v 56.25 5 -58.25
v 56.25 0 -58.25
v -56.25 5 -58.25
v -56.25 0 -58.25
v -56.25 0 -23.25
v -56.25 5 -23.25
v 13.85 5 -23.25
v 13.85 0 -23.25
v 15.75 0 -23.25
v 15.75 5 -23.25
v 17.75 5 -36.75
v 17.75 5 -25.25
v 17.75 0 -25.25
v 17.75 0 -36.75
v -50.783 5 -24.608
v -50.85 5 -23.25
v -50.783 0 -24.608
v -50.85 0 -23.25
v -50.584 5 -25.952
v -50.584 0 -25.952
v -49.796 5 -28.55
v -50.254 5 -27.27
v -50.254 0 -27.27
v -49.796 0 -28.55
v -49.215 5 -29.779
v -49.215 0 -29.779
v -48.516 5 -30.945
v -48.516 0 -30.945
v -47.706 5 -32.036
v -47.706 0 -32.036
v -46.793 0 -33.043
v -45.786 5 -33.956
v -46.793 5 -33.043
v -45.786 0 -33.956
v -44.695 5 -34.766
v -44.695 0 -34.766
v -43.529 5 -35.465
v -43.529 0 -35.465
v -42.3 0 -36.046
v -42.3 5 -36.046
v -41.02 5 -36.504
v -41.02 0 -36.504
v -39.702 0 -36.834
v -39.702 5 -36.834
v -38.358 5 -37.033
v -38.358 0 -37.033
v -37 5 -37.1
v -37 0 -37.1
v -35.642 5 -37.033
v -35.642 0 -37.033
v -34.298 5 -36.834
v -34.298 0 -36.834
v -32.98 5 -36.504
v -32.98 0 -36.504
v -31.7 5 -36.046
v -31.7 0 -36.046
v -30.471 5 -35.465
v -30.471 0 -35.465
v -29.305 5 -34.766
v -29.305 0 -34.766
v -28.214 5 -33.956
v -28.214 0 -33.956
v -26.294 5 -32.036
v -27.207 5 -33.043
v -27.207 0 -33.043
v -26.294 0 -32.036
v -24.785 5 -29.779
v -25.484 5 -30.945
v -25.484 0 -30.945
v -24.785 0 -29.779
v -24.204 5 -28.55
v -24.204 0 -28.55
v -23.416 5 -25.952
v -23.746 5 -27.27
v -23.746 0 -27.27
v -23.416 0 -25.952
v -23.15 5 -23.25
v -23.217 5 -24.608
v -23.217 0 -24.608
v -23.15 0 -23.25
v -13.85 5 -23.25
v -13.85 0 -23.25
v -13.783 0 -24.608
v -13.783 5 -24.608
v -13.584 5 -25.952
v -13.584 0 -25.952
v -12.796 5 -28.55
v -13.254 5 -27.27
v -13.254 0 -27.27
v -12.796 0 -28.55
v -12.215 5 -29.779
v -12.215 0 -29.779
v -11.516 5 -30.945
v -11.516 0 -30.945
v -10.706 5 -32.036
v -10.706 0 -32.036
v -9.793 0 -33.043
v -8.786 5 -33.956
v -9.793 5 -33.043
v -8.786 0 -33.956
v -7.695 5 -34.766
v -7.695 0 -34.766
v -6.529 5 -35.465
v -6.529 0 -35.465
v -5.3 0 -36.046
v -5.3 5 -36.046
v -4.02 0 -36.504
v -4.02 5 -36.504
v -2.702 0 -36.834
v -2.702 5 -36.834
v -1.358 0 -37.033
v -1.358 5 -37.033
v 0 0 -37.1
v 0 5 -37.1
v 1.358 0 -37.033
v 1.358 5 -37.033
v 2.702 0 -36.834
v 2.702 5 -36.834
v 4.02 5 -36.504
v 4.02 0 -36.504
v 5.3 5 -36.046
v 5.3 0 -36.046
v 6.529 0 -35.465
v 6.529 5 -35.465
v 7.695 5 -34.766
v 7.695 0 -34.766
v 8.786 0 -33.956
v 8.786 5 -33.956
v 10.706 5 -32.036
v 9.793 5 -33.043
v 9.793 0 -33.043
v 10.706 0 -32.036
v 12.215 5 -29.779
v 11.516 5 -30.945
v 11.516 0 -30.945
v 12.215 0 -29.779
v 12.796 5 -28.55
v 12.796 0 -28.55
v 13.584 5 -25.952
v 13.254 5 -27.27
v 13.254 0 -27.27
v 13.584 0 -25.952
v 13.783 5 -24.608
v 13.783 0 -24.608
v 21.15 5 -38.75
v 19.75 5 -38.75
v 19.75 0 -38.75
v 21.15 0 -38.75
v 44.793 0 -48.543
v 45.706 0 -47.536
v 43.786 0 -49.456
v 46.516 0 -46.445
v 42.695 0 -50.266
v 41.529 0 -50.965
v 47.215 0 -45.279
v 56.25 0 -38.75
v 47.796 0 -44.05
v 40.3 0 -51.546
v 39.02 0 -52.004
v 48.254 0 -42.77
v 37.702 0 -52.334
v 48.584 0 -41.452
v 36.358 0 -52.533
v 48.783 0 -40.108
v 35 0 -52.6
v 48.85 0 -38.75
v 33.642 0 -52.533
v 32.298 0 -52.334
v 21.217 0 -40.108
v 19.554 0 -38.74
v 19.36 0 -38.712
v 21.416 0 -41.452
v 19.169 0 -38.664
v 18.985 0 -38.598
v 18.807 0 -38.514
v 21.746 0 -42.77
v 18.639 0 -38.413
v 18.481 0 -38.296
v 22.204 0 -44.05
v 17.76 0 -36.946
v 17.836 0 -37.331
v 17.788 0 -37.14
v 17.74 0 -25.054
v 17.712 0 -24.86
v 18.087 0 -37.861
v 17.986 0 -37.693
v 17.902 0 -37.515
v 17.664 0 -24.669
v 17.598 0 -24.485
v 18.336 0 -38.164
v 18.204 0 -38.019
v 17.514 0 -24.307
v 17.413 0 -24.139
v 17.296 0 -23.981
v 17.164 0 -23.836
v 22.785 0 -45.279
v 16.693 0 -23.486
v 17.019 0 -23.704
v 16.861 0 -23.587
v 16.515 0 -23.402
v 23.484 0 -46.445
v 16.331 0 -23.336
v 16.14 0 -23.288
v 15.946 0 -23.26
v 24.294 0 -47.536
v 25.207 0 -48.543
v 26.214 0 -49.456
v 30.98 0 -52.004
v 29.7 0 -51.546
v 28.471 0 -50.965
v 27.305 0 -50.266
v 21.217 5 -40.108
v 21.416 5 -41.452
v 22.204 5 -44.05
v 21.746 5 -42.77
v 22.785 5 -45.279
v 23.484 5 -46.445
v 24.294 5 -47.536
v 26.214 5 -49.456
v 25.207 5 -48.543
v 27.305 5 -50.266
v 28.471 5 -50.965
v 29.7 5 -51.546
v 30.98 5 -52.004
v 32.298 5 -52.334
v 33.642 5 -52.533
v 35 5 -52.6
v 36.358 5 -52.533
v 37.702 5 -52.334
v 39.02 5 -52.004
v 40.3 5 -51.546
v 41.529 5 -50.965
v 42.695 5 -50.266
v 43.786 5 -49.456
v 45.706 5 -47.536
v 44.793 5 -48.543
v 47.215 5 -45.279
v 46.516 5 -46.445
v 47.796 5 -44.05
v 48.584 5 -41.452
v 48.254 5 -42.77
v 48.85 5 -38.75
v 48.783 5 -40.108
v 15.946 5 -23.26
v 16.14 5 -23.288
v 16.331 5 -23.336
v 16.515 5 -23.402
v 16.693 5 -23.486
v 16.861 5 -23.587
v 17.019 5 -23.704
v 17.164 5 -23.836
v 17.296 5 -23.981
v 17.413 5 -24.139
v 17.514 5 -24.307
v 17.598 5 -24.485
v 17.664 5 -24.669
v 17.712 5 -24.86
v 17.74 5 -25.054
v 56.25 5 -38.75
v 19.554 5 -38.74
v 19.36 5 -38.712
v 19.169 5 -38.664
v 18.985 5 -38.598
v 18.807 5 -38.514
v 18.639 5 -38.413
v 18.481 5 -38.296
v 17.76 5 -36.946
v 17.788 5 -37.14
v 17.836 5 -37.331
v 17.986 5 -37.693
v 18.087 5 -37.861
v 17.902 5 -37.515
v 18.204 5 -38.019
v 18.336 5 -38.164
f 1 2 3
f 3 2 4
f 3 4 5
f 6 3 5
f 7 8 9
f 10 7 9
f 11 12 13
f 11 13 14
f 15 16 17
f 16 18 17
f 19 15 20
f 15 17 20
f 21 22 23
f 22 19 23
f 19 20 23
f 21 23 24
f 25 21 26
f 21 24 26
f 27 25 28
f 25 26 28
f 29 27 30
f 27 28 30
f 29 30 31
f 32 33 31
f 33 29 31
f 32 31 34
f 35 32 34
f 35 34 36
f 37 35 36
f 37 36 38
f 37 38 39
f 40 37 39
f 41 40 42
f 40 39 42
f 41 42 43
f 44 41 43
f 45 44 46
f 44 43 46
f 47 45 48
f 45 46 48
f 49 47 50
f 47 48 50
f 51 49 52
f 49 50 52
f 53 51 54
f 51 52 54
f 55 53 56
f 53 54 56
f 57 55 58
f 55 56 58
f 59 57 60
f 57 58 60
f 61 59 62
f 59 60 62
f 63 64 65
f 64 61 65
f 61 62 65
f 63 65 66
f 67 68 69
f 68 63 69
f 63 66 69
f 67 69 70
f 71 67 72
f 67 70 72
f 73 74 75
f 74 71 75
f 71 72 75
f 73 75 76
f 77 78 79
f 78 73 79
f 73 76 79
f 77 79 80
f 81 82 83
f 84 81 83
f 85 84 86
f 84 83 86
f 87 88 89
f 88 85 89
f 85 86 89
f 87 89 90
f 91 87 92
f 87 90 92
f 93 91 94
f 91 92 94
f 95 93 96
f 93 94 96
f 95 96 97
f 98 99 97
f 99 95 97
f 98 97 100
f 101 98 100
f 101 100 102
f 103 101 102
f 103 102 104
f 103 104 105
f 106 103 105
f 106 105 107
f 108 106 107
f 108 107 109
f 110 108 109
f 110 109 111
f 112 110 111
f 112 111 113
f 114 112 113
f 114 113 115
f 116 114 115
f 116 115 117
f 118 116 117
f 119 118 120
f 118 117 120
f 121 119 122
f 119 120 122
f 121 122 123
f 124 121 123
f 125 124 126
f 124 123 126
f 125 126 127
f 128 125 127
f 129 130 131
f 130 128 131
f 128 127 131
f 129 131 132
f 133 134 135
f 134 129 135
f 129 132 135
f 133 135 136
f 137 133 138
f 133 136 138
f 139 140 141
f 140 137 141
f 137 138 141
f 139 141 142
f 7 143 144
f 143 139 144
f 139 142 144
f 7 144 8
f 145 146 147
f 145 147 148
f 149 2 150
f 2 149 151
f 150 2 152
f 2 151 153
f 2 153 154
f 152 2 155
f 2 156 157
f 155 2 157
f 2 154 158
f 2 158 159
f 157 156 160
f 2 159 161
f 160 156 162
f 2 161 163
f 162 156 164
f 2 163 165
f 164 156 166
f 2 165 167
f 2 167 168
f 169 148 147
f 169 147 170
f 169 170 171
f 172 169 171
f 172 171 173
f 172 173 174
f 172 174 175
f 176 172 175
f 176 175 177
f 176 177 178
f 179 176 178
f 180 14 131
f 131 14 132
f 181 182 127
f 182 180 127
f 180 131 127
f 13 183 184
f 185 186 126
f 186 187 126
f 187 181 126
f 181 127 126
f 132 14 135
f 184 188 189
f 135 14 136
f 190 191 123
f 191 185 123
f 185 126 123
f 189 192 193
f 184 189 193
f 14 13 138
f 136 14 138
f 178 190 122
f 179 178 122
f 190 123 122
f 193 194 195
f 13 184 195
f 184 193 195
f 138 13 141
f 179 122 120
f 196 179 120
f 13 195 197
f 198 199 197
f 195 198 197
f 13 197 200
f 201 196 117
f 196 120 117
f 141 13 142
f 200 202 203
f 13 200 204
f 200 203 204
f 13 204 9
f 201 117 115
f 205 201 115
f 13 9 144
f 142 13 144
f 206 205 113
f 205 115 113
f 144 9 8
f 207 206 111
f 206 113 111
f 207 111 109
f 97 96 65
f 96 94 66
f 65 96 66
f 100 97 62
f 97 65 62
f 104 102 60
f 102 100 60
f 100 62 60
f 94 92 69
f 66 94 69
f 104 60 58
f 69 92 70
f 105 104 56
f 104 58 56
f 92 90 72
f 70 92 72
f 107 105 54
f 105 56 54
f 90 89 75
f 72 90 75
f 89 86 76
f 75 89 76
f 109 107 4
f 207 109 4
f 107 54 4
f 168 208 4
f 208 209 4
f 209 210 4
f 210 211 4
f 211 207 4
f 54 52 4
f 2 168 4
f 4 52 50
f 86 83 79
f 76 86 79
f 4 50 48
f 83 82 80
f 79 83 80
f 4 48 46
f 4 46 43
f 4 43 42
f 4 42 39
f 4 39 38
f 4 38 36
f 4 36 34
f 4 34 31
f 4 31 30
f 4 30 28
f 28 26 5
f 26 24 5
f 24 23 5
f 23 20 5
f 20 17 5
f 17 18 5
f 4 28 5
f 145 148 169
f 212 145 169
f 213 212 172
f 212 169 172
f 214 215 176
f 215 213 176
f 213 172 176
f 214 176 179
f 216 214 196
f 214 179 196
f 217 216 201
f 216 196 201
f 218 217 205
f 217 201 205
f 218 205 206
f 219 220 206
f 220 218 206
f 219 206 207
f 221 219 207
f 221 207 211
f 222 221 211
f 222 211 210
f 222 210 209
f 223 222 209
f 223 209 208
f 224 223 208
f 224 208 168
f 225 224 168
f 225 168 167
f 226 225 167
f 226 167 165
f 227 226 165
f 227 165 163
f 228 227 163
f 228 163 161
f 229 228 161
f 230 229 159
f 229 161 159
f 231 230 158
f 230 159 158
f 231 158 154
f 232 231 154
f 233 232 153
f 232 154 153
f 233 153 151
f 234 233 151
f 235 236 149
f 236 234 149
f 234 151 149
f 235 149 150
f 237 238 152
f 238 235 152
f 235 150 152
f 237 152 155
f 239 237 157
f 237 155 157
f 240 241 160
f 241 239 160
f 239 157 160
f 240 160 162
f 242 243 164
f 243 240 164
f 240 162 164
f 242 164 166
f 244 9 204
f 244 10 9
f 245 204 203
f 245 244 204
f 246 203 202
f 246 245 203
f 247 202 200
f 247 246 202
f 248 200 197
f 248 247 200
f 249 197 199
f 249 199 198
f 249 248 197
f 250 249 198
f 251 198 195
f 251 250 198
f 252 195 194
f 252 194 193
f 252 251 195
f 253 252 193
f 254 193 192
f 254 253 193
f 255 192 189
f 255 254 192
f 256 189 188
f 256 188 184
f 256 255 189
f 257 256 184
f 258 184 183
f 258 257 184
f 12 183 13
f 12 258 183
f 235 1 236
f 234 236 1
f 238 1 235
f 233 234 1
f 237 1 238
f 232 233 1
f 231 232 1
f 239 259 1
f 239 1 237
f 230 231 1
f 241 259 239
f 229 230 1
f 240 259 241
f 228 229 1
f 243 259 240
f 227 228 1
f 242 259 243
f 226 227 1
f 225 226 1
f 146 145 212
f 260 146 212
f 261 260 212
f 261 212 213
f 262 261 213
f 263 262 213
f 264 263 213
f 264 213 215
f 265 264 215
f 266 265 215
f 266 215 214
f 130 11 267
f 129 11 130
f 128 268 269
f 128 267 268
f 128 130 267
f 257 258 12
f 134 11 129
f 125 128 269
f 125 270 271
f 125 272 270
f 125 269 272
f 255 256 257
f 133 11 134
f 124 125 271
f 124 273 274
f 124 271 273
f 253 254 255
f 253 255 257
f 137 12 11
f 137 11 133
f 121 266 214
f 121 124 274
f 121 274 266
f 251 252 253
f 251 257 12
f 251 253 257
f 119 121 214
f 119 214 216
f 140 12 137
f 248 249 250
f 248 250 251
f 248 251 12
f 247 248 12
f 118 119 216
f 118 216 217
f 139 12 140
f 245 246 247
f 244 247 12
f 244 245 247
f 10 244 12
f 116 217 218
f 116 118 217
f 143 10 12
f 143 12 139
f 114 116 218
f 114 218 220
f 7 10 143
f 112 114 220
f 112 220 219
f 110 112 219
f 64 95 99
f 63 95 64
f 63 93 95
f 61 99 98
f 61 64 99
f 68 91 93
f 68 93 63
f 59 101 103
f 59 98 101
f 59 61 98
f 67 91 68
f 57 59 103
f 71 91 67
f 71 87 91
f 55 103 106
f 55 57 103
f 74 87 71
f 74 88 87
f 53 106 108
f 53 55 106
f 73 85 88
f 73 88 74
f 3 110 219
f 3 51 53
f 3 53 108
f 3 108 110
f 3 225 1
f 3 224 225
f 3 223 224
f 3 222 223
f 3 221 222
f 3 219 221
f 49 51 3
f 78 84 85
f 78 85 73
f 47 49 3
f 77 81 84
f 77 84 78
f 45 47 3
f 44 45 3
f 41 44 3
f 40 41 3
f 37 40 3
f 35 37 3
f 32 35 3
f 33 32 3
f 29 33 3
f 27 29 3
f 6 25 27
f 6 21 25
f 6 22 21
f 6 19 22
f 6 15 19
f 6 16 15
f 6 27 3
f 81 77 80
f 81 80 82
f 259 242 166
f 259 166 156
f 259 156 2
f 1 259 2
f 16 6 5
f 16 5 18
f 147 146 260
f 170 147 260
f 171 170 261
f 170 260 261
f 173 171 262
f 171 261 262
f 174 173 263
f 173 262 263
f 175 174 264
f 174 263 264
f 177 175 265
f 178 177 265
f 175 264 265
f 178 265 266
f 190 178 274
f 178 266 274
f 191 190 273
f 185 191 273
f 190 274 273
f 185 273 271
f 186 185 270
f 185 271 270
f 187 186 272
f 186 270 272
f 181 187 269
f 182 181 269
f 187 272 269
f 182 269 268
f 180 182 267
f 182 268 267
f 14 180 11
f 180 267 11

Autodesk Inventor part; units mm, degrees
ref_plane "YZ Plane" through (0, 0, 0) normal (1, 0, 0) x (0, 1, 0)
ref_plane "XZ Plane" through (0, 0, 0) normal (0, 1, 0) x (-1, 0, 0)
ref_plane "XY Plane" through (0, 0, 0) normal (0, 0, 1) x (1, 0, 0)
sketch "Sketch1" plane through (0, 0, 0) normal (0, 1, 0) x (-1, 0, 0)
  circle A0 centre (18.5, 28) radius 23.85
  circle A1 centre (37, -23.25) radius 13.85
  circle A2 centre (-35, -38.75) radius 13.85
  circle A3 centre (-30.9, 25.8) radius 13.85
  circle A4 centre (0, -23.25) radius 13.85
  line L0 (56.25, 58.25) -> (-56.25, 58.25)
  line L1 (-56.25, -58.25) -> (56.25, -58.25)
  line L2 (0, -105.9299) -> (0, 123.2086) construction
  line L3 (-76.4777, -38.75) -> (-5.35, -38.75) construction
  line L4 (-123.5447, -23.25) -> (82.5572, -23.25) construction
  line L5 (56.25, -58.25) -> (56.25, 58.25)
  line L6 (56.25, 58.25) -> (56.25, -58.25)
  line L7 (-56.25, 58.25) -> (-56.25, -58.25)
  line L8 (100.0459, 28) -> (-13.85, 28) construction
  line L9 (-9.7154, 25.8) -> (-68.4996, 25.8) construction
  line L10 (18.5, 82.6038) -> (18.5, -4.654) construction
  line L11 (-30.9, 82.6038) -> (-30.9, 8.6393) construction
  line L12 (-46.6436, -58.25) -> (-56.25, -58.25) construction
  line L13 (-56.25, -58.25) -> (-56.25, -31.25) construction
  line L14 (-56.25, -31.25) -> (-46.6436, -31.25) construction
  line L15 (-46.6436, -31.25) -> (-46.6436, -58.25) construction
  line L16 (56.25, -58.25) -> (48.3059, -58.25) construction
  line L17 (48.3059, -58.25) -> (48.3059, -31.25) construction
  line L18 (48.3059, -31.25) -> (56.25, -31.25) construction
  line L19 (56.25, -31.25) -> (56.25, -58.25) construction
  point P0 (0, 0)
  point P1 (0, 0)
  dimension "d1" = 27.7
  dimension "d2" = 27.7
  dimension "d0" = 47.7
  dimension "d3" = 27.7
  dimension "d4" = 27.7
  dimension "d7" = 37
  dimension "d9" = 30.9
  dimension "d10" = 19.5
  dimension "d11" = 35
  dimension "d12" = 35
  dimension "d13" = 25.8
  dimension "d14" = 28
  dimension "d15" = 56.25
  dimension "d16" = 58.25
  dimension "d17" = 116.5
  dimension "d18" = 112.5
  dimension "d19" = 18.5
  dimension "d20" = 32.45
  dimension "d31" = 27
  dimension "d32" = 9.6064
  dimension "d33" = 27
  dimension "d34" = 7.9441
extrude "Extrusion1" add sketch "Sketch1" along normal blind 5
sketch "Sketch2" plane through (0, 5, 0) normal (0, 1, 0) x (1, 0, 0)
  line L0 (-56.25, 58.25) -> (-56.25, -58.25) projected
  line L1 (-56.25, -58.25) -> (56.25, -58.25) projected
  line L2 (56.25, -58.25) -> (56.25, 58.25) projected
  line L3 (56.25, 58.25) -> (-56.25, 58.25) projected
  circle A0 centre (0, 23.25) radius 13.85 projected
  circle A1 centre (30.9, -25.8) radius 13.85 projected
  circle A2 centre (35, 38.75) radius 13.85 projected
  circle A3 centre (-37, 23.25) radius 13.85 projected
  circle A4 centre (-18.5, -28) radius 23.85 projected
  line L4 (-56.25, 58.25) -> (-56.25, -58.25) projected
  line L5 (-56.25, 23.25) -> (15.75, 23.25)
  line L6 (19.75, 38.75) -> (56.25, 38.75)
  line L7 (56.25, -58.25) -> (56.25, 58.25) projected
  line L8 (17.75, 25.25) -> (17.75, 36.75)
  arc A5 (15.75, 23.25) -> (17.75, 25.25) centre (15.75, 25.25) ccw
  arc A6 (19.75, 38.75) -> (17.75, 36.75) centre (19.75, 36.75) ccw
  point P0 (0, 0)
  point P1 (17.75, 23.25)
  point P2 (17.75, 38.75)
  point P3 (48.85, 38.75)
  point P4 (21.15, 38.75)
  point P5 (13.85, 23.25)
  point P6 (-13.85, 23.25)
  point P7 (-23.15, 23.25)
  point P8 (-50.85, 23.25)
  dimension "d23" = 74
  dimension "d25" = 38.5
  dimension "d26" = 2
  dimension "d27" = 35
  dimension "d28" = 19.5
extrude "Extrusion2" cut sketch "Sketch2" against normal through all contours L5 A3 A0 A5 L8 A6 L6 A2 L2 L1 L0
properties part number "Top Bottle Back"
